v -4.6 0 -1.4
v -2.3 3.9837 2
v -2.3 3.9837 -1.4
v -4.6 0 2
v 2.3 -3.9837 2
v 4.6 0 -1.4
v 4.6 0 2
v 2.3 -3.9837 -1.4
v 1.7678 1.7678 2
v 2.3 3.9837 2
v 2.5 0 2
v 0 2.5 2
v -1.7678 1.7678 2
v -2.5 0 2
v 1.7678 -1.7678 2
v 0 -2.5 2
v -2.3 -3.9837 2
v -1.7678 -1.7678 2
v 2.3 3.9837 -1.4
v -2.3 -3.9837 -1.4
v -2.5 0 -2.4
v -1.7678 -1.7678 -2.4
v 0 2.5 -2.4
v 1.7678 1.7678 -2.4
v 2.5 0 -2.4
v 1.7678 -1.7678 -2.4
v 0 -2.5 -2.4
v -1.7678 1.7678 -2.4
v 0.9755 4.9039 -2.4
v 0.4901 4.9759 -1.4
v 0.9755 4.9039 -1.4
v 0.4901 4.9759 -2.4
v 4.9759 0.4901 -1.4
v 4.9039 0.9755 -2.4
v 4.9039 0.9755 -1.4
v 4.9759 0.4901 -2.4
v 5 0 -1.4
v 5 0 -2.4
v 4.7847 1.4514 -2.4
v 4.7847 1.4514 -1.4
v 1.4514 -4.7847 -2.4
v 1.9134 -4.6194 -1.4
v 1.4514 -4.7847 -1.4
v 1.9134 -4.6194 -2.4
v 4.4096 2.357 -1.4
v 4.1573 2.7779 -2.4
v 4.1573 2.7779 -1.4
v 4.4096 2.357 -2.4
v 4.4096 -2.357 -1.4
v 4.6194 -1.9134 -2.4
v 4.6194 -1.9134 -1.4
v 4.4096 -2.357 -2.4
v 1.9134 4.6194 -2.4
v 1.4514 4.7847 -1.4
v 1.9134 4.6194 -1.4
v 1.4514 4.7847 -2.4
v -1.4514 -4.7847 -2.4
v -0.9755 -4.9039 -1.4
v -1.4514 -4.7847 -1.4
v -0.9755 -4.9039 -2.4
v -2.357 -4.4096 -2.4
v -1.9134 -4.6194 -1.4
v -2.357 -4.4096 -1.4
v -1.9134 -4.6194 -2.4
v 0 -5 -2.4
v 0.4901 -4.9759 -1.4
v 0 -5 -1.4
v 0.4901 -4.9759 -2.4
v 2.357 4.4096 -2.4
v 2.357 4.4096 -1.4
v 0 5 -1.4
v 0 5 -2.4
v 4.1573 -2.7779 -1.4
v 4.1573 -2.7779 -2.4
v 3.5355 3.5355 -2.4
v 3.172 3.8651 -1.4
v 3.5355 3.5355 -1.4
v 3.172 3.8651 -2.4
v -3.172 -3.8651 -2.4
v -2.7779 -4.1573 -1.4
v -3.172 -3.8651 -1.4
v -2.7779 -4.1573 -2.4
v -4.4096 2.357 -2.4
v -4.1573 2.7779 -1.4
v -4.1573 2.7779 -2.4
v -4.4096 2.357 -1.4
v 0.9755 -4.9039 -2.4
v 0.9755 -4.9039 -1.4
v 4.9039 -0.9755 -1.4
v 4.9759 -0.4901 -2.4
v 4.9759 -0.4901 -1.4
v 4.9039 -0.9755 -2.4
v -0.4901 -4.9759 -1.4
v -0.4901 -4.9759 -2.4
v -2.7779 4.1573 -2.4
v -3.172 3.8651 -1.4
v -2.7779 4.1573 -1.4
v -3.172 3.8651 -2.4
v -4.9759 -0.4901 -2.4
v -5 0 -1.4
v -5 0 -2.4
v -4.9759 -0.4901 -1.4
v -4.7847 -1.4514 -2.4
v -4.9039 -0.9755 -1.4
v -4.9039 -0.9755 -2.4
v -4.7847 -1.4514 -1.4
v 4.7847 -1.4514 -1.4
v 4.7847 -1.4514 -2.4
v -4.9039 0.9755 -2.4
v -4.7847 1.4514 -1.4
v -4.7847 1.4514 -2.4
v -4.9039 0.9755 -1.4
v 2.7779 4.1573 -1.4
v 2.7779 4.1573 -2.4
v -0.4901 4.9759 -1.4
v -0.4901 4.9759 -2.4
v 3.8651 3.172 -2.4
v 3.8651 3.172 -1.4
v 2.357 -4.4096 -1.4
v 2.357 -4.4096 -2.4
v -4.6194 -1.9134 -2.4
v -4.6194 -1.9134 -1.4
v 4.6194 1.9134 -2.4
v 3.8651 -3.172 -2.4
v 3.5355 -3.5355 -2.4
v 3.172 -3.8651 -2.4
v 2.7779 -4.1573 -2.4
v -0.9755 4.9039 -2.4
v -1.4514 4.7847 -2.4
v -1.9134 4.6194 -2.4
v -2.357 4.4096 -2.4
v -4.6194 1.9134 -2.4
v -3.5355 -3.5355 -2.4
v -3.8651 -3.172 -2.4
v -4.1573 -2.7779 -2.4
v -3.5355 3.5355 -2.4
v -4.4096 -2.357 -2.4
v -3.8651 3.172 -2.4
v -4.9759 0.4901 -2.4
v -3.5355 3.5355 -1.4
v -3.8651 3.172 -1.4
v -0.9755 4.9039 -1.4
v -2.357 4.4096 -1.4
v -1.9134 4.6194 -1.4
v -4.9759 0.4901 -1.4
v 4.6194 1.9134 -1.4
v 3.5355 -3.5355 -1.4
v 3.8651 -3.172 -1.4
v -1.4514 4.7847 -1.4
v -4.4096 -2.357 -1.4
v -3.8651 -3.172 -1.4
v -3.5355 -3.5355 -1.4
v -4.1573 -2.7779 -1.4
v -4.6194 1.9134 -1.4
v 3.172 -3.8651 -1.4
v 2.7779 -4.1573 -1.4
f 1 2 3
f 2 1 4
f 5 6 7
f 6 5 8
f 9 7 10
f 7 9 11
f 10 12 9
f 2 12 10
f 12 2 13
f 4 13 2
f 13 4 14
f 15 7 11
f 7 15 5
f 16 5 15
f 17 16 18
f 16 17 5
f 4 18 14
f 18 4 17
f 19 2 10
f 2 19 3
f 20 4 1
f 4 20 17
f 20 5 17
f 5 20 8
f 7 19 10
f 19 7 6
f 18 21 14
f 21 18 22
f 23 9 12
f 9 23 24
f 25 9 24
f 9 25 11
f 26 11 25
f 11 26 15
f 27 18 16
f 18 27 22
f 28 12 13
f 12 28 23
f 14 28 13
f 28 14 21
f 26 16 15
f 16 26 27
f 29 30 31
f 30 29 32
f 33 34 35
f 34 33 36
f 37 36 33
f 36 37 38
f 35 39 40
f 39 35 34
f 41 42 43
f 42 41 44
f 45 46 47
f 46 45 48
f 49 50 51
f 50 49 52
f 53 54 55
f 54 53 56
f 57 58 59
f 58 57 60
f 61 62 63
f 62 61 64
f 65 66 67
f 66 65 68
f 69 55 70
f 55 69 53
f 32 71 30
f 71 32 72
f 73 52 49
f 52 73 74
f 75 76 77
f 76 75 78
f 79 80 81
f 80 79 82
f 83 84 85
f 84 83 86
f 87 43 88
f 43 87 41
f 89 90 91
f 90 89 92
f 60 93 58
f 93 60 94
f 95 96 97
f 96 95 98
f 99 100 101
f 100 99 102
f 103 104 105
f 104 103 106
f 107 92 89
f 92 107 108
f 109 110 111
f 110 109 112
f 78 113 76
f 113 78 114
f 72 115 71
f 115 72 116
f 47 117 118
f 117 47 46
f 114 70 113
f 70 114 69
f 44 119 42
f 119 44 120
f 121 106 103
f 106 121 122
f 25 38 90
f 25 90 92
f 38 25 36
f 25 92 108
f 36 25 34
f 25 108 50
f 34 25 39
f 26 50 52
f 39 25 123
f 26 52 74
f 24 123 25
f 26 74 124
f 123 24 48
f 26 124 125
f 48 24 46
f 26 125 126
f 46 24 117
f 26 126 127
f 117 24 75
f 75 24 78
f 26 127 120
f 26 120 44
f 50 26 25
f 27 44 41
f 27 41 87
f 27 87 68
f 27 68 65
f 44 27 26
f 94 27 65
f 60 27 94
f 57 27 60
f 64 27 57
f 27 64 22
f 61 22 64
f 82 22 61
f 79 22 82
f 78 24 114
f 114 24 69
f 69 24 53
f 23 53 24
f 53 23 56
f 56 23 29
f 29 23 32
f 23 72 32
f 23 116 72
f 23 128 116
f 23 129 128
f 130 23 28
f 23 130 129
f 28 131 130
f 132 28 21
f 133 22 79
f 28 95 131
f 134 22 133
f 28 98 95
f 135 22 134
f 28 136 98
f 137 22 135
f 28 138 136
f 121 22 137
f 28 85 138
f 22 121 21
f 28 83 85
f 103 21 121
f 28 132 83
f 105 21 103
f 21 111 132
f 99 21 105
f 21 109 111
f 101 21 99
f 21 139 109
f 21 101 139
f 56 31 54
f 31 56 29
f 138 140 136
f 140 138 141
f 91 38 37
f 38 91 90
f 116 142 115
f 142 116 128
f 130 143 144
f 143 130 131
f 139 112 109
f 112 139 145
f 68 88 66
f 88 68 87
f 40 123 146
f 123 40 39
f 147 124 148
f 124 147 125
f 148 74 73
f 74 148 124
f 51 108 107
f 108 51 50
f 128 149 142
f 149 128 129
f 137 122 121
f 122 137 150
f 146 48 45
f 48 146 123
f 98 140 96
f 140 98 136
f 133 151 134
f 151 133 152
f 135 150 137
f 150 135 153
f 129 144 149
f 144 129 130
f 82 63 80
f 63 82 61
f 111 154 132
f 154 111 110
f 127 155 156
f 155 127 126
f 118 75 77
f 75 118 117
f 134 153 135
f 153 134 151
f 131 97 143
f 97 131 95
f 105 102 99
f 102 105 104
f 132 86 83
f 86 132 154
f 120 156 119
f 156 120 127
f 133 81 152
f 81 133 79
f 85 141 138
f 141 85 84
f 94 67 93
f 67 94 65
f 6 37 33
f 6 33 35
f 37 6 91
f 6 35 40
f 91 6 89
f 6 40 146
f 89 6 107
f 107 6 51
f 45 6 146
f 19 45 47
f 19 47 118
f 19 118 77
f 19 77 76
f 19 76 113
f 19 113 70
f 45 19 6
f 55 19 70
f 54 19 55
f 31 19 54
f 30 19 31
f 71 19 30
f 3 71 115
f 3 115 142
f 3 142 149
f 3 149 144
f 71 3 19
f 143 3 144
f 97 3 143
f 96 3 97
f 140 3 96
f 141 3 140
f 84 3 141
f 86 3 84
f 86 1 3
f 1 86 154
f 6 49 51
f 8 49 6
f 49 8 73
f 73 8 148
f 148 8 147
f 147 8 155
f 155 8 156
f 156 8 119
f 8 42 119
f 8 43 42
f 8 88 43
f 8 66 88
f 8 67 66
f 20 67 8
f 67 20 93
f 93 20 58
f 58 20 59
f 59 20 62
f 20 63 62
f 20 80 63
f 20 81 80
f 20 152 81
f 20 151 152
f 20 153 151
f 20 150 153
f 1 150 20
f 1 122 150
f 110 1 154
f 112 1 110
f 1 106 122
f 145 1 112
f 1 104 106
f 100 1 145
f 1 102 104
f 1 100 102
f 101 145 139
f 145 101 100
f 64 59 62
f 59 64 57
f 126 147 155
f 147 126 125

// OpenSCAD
// Parameters
thread_nominal_diameter = 5; //[2.5:10:0.1]
across_flats = 9.2; //[4.6:18.4:0.1]
thickness = 4; //[2:8:0.1]
hole_diameter = 5; //[2.5:10:0.1]
eps = 0.6; //[0.2:2:0.1]
washer_outer_diameter = 10; //[5:20:0.1]
washer_thickness = 1; //[0.5:2:0.1]

// Hexagonal Nut
module hex_nut() {
  color("DimGray") {
    difference() {
      intersection() {
        // Hexagonal profile
        linear_extrude(height=thickness, center=true) {
          polygon(points=[
            [across_flats/2, 0],
            [across_flats/4, across_flats*sqrt(3)/4],
            [-across_flats/4, across_flats*sqrt(3)/4],
            [-across_flats/2, 0],
            [-across_flats/4, -across_flats*sqrt(3)/4],
            [across_flats/4, -across_flats*sqrt(3)/4]
          ]);
        }
        // Circular body
        cylinder(r=across_flats/(2*cos(30)), h=thickness, center=true, $fn=6);
      }
      // Central through-hole
      cylinder(r=hole_diameter/2, h=thickness + 2*eps, center=true);
    }
  }
}

// Washer
module washer() {
  color("Silver") {
    difference() {
      // Outer washer
      cylinder(r=washer_outer_diameter/2, h=washer_thickness, center=true, $fn=64);
      // Washer hole
      cylinder(r=hole_diameter/2, h=washer_thickness + 2*eps, center=true);
    }
  }
}

// Nut and Washer Assembly
module nut_and_washer() {
  hex_nut();
  translate([0, 0, -(thickness/2 + washer_thickness/2 - eps)]) washer();
}

// Final Assembly
module assembly() {
  nut_and_washer();
}

assembly();
